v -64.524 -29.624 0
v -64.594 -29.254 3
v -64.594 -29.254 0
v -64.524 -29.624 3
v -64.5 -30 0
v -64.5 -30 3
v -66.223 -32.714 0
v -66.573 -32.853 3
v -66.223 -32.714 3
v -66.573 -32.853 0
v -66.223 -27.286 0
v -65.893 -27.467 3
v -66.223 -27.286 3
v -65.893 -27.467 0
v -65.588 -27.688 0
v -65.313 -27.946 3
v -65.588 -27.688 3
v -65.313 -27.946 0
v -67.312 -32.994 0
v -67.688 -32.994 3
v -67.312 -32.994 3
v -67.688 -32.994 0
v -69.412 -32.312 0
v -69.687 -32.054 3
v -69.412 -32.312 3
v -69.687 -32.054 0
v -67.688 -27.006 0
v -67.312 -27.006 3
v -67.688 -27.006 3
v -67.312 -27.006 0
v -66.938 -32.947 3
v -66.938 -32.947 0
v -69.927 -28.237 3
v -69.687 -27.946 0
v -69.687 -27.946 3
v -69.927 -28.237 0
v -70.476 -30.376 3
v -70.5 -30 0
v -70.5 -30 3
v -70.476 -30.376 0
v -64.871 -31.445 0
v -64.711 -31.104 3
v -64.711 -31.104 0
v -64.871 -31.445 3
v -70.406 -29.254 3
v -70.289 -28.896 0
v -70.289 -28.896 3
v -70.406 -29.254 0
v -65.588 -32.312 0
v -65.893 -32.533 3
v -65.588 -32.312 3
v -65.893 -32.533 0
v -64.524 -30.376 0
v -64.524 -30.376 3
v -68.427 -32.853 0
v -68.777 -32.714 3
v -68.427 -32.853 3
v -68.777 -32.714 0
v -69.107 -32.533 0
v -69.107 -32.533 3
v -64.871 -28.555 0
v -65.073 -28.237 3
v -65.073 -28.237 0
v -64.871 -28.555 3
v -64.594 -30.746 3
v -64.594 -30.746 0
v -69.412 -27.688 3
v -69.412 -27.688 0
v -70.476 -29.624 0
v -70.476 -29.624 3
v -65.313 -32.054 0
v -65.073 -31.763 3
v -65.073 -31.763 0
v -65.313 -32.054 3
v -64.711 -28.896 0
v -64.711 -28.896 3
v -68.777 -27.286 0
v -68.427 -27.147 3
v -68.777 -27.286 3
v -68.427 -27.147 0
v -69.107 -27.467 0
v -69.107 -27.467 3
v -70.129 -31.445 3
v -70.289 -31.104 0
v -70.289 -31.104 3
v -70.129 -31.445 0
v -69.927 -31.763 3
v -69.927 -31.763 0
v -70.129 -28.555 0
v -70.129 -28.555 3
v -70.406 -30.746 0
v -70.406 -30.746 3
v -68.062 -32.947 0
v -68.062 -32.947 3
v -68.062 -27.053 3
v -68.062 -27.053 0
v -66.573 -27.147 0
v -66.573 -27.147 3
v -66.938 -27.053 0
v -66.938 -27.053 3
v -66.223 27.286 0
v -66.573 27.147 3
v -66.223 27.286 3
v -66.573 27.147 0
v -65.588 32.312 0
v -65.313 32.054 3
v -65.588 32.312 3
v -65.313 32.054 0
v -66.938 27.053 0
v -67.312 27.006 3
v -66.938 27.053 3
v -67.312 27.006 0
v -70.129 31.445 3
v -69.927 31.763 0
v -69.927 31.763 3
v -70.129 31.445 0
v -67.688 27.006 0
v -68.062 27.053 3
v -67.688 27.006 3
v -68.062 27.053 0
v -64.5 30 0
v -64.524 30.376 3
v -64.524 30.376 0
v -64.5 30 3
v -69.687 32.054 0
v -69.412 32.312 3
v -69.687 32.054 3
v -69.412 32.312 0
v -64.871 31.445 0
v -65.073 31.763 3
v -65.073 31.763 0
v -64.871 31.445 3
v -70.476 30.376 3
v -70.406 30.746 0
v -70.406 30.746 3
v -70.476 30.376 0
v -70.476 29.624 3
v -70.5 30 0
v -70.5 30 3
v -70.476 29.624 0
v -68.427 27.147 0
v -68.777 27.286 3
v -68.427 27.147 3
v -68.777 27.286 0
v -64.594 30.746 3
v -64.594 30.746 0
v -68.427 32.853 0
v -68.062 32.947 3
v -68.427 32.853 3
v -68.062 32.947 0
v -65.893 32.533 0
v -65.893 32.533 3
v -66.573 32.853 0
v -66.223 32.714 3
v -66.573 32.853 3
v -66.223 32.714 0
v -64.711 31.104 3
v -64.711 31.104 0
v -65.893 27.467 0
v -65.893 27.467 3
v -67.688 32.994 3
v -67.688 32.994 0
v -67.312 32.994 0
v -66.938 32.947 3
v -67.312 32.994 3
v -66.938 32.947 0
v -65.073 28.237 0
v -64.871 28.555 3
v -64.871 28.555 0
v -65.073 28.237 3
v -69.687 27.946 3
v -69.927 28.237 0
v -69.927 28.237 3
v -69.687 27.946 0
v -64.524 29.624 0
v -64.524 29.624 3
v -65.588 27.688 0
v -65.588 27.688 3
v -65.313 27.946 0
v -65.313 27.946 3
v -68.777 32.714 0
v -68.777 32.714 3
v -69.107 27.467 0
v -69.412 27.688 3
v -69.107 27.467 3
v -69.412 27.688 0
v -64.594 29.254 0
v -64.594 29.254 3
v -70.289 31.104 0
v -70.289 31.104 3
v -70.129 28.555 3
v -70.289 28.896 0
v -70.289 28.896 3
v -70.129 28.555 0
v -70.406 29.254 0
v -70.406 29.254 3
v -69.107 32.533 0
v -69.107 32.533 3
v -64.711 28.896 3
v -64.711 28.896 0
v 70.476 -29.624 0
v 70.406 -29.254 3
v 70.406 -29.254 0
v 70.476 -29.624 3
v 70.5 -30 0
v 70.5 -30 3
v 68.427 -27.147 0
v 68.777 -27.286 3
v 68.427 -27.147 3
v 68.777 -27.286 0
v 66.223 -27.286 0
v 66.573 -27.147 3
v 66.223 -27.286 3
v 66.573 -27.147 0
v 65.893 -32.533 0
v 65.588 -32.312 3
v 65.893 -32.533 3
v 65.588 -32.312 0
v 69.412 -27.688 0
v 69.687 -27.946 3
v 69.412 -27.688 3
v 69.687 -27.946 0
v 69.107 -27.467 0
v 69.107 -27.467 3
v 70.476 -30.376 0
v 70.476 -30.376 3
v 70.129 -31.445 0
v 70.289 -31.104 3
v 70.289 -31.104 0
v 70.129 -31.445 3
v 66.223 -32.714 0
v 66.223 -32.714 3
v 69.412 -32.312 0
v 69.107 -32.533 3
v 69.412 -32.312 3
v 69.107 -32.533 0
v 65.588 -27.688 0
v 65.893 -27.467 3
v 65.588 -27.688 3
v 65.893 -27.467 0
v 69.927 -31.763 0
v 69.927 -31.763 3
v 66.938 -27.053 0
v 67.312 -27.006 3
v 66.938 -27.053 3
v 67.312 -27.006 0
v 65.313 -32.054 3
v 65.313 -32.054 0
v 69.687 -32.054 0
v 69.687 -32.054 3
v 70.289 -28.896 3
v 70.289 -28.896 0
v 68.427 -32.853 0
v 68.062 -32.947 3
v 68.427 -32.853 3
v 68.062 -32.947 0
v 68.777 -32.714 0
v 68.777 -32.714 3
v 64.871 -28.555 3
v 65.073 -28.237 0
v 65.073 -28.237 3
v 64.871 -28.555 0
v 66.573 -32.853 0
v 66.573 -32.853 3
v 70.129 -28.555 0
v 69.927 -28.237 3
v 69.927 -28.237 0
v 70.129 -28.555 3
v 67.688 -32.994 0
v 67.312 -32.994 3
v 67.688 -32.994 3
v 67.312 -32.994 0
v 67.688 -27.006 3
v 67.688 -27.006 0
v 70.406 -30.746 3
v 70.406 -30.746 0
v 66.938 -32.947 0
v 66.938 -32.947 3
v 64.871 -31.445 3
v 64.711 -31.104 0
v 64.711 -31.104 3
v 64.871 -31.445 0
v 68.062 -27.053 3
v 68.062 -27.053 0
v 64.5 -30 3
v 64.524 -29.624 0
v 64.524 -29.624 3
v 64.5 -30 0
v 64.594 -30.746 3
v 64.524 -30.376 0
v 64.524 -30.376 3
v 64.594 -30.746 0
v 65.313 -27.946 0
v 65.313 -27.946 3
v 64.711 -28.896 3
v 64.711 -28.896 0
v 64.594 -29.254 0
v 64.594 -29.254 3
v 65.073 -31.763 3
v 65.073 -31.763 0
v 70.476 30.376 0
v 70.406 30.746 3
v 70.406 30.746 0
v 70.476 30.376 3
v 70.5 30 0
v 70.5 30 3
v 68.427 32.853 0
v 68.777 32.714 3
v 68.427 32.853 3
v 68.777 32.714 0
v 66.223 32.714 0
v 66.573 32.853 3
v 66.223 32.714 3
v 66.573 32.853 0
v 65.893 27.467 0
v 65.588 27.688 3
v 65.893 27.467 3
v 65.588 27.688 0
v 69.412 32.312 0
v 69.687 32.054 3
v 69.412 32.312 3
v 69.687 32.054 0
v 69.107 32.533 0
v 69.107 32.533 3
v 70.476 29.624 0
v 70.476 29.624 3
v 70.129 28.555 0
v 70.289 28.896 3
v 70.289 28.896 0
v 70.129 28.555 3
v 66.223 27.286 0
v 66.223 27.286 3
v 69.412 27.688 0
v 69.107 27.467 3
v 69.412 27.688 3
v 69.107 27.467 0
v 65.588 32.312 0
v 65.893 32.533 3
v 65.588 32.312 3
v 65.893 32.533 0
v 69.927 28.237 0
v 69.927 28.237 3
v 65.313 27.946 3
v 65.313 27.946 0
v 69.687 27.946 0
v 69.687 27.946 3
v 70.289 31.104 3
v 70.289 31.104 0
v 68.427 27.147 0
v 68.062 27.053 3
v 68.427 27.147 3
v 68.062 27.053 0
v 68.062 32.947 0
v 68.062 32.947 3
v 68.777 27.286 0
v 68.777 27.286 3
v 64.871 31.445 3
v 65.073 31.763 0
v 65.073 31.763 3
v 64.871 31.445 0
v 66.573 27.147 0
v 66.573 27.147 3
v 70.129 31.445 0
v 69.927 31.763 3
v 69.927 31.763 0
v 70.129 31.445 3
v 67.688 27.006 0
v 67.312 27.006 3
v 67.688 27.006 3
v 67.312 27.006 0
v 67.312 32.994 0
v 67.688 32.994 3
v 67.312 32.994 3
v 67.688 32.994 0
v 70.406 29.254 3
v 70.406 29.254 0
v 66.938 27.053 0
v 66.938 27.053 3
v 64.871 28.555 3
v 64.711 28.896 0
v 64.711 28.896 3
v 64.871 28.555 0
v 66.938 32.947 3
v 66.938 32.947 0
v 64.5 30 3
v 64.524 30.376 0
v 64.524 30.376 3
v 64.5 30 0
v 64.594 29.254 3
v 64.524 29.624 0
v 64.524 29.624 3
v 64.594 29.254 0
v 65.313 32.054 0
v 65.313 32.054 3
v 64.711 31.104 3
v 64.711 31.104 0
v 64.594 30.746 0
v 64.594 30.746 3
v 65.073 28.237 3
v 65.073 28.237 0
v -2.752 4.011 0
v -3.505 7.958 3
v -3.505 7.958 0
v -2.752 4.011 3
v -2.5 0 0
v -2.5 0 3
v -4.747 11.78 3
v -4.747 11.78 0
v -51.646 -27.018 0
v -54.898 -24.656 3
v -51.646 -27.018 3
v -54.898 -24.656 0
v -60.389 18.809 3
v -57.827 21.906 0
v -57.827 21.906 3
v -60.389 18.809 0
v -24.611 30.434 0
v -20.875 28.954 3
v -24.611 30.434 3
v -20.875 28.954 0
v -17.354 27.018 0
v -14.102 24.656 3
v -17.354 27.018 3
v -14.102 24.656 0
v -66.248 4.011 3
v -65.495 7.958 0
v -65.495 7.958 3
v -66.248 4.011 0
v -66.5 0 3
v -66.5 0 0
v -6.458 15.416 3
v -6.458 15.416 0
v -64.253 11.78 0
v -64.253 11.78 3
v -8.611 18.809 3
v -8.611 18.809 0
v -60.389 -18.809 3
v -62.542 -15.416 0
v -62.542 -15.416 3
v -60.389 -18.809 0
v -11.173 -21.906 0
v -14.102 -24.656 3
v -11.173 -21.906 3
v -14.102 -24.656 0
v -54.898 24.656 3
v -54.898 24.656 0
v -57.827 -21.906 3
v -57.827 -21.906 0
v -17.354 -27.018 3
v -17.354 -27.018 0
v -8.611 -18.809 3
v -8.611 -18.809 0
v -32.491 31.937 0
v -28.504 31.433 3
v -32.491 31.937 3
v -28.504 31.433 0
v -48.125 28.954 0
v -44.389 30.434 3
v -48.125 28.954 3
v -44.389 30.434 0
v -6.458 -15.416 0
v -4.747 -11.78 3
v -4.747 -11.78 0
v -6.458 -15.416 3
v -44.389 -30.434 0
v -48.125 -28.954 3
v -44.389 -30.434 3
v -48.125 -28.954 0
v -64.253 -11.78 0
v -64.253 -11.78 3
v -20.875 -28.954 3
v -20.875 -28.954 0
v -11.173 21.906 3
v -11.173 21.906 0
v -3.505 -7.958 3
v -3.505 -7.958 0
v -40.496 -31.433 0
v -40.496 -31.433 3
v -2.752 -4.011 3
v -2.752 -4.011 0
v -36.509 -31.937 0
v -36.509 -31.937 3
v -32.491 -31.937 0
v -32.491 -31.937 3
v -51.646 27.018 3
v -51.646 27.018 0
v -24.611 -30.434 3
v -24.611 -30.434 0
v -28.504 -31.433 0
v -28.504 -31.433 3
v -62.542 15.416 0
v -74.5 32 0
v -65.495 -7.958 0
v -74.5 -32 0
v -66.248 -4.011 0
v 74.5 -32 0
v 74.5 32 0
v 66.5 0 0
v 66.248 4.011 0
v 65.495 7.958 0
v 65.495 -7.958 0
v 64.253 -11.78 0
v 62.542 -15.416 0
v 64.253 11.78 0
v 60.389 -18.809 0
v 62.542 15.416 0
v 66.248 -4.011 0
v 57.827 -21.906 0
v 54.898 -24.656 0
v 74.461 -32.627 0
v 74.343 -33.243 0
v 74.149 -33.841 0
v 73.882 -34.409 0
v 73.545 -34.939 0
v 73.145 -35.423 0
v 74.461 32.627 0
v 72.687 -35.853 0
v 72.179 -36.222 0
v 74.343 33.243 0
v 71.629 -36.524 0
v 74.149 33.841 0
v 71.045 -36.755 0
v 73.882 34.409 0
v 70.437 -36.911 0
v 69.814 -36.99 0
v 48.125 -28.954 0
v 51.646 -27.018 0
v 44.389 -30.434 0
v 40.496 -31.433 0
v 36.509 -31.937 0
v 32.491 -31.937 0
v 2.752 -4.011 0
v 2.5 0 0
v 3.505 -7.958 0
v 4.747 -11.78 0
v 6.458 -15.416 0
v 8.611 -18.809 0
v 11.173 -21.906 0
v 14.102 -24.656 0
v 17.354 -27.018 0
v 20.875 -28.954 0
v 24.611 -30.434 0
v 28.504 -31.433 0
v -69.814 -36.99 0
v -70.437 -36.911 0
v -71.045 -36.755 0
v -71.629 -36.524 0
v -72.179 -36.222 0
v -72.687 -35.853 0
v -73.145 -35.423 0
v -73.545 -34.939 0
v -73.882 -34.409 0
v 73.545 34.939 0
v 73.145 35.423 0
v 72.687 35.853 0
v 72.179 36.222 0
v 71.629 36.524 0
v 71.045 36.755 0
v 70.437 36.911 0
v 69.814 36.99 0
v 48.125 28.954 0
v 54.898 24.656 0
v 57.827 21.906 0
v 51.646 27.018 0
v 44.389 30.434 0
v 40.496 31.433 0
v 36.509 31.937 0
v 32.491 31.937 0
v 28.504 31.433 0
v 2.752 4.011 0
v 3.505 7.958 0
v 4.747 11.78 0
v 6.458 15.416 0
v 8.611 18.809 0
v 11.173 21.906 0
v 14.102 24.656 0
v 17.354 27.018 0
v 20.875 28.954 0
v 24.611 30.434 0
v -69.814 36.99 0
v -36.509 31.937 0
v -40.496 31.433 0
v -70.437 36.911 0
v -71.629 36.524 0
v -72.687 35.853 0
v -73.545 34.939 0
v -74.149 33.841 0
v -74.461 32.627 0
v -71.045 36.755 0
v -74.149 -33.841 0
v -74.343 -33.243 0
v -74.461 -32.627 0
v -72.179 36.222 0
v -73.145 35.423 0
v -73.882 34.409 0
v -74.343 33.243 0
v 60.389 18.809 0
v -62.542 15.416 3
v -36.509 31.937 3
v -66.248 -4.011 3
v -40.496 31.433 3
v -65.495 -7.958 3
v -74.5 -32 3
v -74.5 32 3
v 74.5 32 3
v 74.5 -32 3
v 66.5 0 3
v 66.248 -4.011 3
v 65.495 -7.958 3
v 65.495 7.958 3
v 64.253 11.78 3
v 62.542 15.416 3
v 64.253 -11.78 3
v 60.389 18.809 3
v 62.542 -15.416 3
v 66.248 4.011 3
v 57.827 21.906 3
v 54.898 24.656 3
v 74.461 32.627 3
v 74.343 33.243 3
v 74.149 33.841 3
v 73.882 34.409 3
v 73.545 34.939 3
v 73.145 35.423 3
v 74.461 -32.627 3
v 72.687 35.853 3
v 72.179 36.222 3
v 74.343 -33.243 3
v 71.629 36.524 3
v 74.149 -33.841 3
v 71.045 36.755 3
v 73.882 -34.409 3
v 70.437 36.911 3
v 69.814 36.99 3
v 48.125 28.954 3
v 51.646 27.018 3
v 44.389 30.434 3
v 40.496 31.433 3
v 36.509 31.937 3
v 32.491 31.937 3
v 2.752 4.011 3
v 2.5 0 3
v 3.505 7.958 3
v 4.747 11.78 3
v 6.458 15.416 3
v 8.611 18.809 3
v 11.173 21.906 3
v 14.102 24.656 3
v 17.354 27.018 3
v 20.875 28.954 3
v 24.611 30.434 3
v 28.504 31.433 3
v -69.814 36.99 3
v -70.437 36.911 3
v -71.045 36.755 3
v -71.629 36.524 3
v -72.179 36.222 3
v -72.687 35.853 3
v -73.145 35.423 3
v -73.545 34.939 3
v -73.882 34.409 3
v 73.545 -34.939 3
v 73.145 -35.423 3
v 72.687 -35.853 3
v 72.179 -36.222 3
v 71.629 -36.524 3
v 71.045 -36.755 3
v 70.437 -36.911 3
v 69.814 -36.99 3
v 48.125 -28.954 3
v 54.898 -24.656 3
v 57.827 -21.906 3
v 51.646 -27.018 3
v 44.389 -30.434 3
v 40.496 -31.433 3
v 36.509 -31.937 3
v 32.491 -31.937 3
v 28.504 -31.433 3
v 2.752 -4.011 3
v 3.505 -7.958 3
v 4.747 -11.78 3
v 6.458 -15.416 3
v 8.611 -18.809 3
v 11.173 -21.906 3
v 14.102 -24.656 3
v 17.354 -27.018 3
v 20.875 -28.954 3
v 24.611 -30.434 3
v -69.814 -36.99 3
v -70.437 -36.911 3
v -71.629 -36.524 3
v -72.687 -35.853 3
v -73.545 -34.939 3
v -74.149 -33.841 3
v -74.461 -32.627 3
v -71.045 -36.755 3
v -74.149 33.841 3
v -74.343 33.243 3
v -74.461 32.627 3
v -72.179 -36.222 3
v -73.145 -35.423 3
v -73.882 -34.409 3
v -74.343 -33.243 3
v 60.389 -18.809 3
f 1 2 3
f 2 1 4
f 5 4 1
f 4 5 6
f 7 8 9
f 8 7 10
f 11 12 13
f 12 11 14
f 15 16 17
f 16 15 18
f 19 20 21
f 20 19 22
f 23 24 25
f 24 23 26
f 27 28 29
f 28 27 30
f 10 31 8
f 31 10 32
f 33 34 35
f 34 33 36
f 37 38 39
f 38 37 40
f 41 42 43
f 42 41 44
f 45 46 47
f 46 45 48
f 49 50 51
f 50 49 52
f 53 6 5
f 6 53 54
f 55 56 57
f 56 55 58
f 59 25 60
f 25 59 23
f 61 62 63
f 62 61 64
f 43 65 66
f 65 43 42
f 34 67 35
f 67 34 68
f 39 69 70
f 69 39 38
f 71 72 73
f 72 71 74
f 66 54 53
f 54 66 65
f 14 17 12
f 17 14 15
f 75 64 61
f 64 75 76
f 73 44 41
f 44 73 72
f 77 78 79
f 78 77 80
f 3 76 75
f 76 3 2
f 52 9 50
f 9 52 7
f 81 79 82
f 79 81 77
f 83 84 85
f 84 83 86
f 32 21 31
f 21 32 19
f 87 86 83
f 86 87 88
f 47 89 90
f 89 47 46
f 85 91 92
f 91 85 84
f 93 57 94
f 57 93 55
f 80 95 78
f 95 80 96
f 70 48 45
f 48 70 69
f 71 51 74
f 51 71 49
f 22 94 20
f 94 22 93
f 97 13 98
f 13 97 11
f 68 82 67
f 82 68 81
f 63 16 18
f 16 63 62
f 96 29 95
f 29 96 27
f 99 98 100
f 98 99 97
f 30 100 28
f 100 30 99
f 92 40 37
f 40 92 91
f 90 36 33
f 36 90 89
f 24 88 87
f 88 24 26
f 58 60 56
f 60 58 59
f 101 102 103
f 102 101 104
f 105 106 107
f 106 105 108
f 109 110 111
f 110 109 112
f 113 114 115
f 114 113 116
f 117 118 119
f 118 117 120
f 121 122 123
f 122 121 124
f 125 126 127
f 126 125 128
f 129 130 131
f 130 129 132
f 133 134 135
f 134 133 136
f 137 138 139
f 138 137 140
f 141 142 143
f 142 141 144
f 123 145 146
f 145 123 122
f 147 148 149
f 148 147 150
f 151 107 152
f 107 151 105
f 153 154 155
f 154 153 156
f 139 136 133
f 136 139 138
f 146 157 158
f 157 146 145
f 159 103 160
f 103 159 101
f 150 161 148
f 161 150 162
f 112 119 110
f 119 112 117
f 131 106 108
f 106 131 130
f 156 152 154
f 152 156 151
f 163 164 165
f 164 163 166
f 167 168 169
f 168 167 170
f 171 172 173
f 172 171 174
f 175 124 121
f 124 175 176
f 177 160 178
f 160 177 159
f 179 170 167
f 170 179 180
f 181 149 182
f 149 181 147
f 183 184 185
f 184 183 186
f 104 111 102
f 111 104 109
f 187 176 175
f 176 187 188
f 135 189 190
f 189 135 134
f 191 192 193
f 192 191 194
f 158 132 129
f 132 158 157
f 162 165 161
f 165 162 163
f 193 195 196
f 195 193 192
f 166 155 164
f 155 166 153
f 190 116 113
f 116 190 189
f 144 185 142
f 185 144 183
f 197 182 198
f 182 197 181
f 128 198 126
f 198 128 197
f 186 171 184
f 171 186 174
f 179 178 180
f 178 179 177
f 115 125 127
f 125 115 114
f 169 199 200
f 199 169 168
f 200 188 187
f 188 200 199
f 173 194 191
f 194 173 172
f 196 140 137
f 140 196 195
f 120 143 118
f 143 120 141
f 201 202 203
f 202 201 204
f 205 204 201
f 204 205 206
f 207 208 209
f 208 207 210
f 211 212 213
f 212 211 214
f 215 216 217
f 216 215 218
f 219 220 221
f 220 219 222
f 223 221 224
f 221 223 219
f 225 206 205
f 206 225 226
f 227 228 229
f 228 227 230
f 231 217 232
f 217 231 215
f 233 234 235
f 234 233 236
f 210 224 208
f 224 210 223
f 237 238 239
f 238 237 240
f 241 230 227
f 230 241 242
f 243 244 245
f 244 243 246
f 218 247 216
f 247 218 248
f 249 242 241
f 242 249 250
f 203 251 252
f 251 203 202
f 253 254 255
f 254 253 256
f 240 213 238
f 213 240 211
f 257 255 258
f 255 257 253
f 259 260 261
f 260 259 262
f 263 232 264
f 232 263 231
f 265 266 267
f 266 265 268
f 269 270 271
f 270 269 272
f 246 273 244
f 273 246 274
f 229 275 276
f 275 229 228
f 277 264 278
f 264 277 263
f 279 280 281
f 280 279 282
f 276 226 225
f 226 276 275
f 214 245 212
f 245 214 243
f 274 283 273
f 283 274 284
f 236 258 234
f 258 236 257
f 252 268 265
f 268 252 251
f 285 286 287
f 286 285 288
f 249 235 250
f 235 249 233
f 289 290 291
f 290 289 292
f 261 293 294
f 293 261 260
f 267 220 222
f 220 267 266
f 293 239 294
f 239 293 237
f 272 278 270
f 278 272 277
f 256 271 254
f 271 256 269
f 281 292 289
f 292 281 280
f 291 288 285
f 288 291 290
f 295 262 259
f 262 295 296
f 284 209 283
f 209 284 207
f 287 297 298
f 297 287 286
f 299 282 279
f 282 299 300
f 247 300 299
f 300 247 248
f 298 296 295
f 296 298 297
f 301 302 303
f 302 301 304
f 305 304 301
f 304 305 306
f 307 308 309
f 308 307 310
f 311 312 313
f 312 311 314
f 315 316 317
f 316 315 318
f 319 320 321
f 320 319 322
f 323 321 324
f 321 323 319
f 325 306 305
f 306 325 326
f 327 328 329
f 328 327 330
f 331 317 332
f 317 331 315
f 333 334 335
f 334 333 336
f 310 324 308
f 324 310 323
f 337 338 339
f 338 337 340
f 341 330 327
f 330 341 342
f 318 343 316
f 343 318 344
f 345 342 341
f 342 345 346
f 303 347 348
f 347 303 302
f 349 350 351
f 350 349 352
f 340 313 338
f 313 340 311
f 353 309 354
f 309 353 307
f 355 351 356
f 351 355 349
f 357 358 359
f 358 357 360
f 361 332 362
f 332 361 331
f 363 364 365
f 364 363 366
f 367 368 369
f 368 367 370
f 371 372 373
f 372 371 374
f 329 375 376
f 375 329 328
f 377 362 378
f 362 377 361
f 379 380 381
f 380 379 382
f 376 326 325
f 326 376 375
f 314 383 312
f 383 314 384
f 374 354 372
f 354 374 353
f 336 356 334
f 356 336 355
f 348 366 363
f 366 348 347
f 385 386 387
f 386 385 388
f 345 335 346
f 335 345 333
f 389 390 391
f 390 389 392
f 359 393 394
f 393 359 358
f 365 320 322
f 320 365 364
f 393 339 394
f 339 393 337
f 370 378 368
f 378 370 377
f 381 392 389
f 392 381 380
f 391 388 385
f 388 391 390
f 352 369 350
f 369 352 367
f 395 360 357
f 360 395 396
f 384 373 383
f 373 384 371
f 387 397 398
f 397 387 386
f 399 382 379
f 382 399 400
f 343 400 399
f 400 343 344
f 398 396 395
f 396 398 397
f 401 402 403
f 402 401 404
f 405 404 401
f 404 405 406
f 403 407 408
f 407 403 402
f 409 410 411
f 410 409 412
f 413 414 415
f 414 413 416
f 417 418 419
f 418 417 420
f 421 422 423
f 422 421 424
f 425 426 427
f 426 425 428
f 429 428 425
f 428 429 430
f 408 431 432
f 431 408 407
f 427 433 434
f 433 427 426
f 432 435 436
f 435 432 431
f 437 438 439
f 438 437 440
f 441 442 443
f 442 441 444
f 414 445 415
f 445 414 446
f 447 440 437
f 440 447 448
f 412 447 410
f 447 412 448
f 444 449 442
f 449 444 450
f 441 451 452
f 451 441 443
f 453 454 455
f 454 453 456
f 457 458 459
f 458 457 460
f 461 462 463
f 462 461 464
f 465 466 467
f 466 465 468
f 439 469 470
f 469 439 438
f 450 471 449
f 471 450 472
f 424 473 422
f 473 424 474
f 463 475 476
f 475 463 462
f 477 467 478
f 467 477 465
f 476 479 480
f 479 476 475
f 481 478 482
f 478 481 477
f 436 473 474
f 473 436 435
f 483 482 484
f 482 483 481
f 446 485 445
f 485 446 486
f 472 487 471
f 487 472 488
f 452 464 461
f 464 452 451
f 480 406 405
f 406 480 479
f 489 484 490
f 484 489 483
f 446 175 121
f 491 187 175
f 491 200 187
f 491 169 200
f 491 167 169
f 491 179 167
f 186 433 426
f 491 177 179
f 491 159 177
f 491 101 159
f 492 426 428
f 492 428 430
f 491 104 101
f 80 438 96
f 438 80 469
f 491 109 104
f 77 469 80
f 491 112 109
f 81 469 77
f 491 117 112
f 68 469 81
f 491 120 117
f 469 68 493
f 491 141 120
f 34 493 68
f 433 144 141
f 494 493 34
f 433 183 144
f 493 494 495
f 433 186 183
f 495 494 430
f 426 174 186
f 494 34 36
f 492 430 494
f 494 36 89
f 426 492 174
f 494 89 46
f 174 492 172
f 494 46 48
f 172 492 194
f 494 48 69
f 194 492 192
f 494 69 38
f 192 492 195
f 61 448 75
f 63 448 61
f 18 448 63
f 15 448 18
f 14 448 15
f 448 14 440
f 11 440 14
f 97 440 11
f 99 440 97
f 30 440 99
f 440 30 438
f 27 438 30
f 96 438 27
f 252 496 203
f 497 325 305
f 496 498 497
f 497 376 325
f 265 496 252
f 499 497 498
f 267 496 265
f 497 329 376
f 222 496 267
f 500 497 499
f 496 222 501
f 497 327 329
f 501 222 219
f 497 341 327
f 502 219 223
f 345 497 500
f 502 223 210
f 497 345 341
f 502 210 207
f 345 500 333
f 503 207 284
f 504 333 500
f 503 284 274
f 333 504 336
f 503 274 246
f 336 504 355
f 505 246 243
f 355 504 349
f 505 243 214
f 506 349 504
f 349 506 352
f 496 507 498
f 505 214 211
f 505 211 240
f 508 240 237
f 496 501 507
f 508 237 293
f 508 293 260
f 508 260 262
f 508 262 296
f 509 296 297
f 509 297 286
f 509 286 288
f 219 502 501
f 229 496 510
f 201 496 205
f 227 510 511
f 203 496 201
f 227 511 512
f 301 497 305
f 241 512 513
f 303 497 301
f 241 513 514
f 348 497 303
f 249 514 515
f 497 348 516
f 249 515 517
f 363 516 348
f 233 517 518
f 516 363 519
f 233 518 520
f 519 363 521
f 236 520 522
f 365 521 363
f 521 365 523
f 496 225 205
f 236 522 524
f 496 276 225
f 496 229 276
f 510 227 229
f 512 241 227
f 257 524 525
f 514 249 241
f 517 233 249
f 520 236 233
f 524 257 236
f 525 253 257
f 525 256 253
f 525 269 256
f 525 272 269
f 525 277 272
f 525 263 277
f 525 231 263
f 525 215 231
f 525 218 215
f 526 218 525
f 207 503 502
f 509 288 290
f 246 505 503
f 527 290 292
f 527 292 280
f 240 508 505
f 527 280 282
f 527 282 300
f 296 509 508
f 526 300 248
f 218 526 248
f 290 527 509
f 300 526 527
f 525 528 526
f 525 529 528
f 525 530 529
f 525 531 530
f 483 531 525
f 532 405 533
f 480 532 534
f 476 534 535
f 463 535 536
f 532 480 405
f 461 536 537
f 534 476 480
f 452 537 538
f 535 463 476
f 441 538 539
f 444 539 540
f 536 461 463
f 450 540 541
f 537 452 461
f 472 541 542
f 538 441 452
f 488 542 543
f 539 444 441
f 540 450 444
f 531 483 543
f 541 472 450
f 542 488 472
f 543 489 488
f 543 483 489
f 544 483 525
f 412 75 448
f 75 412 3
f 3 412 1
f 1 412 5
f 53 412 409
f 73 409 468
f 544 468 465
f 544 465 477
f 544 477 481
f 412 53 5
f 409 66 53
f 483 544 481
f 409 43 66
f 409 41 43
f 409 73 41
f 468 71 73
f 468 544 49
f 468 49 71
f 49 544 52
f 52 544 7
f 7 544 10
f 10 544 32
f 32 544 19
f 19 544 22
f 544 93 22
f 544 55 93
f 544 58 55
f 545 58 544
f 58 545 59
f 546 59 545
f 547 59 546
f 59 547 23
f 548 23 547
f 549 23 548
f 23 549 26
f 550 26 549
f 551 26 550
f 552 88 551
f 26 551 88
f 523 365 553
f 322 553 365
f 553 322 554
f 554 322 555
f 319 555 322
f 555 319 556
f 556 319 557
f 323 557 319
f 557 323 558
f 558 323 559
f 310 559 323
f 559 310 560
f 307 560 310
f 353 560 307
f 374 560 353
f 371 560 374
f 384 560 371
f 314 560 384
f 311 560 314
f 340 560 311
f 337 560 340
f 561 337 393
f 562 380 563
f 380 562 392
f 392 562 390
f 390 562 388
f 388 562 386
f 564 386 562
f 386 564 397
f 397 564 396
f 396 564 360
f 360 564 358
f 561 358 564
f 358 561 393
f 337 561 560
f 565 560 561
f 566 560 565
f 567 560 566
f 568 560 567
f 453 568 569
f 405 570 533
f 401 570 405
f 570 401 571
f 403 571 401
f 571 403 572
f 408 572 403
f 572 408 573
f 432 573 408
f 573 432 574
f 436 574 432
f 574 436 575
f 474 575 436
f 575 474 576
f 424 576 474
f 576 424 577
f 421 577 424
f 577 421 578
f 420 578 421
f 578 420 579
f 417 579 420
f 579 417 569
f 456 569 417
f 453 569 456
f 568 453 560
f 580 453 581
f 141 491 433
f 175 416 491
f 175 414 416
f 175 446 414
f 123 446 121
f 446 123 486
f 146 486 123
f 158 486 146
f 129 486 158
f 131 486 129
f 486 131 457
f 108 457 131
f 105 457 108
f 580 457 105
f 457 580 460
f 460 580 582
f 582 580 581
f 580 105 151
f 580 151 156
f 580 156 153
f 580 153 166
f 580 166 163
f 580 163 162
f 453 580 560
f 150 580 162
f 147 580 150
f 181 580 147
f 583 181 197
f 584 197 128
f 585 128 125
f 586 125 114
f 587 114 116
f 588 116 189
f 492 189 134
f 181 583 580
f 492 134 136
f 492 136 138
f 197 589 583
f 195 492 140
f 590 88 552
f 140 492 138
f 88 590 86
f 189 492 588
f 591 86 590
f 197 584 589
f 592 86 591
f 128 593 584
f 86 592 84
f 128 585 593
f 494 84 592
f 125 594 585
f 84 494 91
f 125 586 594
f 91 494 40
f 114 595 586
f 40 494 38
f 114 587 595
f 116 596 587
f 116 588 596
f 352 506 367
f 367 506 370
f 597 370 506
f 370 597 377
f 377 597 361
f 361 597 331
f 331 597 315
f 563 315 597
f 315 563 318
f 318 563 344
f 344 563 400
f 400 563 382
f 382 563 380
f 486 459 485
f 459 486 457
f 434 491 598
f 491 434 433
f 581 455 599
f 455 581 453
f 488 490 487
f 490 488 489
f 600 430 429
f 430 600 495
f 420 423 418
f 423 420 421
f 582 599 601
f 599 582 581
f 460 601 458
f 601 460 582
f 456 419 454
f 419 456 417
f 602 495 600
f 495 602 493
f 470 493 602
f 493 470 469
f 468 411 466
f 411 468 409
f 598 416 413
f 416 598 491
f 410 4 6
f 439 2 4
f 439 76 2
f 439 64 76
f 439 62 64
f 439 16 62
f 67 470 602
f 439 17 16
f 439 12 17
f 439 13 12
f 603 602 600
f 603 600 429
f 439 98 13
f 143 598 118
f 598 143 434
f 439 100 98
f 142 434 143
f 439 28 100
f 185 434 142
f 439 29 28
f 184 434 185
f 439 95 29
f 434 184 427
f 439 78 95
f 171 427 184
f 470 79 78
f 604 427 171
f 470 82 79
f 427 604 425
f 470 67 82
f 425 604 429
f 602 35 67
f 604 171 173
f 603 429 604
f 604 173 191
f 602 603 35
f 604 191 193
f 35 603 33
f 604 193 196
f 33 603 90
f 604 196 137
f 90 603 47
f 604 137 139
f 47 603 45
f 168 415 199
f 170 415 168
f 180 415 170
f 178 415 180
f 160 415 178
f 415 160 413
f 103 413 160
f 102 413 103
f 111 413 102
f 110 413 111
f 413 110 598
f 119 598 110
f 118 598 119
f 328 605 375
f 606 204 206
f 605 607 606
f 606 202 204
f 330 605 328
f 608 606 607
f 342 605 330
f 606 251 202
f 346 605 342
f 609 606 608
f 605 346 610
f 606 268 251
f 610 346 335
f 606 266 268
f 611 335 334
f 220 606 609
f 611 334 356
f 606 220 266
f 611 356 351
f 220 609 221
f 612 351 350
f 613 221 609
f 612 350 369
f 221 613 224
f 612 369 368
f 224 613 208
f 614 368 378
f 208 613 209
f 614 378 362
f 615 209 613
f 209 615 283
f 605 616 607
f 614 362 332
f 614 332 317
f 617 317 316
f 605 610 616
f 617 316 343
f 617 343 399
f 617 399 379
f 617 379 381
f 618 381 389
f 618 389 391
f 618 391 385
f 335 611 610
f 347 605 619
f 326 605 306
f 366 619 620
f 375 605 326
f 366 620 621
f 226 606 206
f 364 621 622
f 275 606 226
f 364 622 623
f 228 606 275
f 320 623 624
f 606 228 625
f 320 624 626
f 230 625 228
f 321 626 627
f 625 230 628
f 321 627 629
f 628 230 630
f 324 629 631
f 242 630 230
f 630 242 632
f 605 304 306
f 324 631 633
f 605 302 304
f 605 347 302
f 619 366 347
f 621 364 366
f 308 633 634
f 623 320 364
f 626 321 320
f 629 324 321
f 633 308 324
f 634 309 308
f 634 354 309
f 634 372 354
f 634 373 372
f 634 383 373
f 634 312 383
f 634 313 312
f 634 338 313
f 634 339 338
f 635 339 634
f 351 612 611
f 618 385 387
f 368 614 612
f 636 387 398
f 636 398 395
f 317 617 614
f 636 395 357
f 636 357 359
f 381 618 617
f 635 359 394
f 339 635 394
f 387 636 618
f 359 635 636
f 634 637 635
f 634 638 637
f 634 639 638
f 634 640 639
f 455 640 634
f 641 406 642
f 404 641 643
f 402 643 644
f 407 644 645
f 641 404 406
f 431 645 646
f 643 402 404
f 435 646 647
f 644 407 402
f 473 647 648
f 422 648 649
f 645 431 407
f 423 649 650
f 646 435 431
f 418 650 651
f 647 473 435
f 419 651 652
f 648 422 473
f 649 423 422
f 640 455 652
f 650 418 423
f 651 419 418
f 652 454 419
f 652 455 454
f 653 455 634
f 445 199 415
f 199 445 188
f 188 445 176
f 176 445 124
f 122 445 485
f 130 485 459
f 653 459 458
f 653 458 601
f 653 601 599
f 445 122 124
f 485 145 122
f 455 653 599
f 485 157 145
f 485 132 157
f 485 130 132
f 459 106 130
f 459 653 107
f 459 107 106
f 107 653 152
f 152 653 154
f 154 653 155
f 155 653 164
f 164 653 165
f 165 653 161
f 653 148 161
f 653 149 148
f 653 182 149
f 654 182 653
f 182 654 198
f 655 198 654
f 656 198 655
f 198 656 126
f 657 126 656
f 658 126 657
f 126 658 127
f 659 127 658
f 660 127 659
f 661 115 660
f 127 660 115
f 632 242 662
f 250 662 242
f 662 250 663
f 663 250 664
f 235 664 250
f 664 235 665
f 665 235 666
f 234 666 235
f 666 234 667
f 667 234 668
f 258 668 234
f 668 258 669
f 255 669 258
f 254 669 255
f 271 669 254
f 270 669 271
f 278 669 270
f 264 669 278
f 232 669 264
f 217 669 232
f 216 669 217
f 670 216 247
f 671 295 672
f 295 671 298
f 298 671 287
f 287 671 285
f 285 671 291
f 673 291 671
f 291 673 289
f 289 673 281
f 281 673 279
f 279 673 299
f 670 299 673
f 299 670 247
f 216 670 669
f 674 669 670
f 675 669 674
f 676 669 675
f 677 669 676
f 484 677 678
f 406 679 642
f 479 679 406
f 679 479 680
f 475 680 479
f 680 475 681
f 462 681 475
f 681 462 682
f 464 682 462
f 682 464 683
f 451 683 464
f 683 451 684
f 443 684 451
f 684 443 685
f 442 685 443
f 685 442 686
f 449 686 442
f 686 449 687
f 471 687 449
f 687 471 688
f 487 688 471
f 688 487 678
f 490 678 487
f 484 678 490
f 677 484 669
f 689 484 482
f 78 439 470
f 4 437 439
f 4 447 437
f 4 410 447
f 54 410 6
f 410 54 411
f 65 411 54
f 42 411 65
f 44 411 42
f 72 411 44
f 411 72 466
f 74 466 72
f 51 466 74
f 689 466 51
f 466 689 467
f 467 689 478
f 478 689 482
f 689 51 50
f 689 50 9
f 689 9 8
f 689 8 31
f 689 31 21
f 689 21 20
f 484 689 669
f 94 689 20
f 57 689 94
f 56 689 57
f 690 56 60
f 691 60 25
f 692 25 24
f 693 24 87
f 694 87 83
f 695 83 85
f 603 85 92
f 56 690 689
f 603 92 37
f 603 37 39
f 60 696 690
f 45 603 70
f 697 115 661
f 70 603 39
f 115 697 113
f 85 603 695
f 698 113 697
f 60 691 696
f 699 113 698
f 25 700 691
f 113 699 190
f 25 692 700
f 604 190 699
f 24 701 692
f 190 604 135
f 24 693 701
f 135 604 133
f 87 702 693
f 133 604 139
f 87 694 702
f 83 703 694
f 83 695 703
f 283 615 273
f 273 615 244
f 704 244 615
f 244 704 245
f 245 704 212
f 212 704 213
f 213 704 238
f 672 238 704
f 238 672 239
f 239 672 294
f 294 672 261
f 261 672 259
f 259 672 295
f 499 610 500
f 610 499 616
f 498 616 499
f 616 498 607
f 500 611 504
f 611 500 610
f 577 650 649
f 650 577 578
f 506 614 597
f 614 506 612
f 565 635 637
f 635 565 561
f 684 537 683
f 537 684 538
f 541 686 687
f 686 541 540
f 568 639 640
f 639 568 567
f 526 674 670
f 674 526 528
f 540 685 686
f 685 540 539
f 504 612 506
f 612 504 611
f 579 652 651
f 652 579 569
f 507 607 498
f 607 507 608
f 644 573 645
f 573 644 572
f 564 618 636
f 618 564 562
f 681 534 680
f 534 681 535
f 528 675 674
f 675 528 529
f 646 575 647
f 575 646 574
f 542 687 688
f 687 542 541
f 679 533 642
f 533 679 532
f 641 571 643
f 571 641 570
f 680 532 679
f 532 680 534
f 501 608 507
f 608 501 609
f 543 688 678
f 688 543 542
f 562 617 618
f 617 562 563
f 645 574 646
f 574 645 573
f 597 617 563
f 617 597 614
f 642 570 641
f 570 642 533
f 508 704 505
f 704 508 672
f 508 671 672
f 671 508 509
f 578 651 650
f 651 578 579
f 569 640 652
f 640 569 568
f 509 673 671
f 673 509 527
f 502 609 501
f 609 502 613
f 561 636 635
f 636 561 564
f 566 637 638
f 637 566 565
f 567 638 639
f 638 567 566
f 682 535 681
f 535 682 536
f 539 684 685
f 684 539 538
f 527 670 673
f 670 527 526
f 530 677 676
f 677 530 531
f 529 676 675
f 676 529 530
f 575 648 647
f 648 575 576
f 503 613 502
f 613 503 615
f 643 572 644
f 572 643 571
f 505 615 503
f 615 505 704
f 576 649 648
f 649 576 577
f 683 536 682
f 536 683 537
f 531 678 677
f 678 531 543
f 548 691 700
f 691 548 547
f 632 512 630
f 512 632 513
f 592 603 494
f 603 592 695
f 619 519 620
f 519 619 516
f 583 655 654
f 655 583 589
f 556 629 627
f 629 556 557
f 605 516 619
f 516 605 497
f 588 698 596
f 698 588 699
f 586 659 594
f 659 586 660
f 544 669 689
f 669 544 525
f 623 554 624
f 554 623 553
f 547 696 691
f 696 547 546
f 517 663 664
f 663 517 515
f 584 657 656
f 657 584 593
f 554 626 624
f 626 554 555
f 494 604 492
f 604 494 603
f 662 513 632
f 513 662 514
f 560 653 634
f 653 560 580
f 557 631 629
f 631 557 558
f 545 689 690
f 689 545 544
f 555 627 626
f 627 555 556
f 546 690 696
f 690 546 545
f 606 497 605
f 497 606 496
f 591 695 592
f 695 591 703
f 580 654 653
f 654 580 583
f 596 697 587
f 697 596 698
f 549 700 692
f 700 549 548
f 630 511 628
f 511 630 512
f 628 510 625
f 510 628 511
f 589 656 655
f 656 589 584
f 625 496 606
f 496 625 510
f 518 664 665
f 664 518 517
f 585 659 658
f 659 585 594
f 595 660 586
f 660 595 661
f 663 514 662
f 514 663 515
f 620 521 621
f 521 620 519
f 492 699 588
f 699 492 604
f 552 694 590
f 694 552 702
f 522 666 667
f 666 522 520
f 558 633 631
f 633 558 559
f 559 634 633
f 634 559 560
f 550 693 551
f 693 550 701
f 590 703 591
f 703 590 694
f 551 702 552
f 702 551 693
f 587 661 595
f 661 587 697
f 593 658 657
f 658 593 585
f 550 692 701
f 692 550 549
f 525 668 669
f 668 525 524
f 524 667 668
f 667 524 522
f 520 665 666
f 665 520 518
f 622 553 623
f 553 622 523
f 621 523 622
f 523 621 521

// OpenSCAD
$fn = 50;


difference() {
	union() {
		hull() {
			translate(v = [-69.5000000000, 32.0000000000, 0]) {
				cylinder(h = 3, r = 5);
			}
			translate(v = [69.5000000000, 32.0000000000, 0]) {
				cylinder(h = 3, r = 5);
			}
			translate(v = [-69.5000000000, -32.0000000000, 0]) {
				cylinder(h = 3, r = 5);
			}
			translate(v = [69.5000000000, -32.0000000000, 0]) {
				cylinder(h = 3, r = 5);
			}
		}
	}
	union() {
		#translate(v = [-67.5000000000, -30.0000000000, -100.0000000000]) {
			cylinder(h = 200, r = 3.0000000000);
		}
		#translate(v = [-67.5000000000, 30.0000000000, -100.0000000000]) {
			cylinder(h = 200, r = 3.0000000000);
		}
		#translate(v = [67.5000000000, -30.0000000000, -100.0000000000]) {
			cylinder(h = 200, r = 3.0000000000);
		}
		#translate(v = [67.5000000000, 30.0000000000, -100.0000000000]) {
			cylinder(h = 200, r = 3.0000000000);
		}
		#translate(v = [-34.5000000000, 0, 0]) {
			cylinder(h = 3, r = 32.0000000000);
		}
		#translate(v = [34.5000000000, 0, 0]) {
			cylinder(h = 3, r = 32.0000000000);
		}
	}
}
